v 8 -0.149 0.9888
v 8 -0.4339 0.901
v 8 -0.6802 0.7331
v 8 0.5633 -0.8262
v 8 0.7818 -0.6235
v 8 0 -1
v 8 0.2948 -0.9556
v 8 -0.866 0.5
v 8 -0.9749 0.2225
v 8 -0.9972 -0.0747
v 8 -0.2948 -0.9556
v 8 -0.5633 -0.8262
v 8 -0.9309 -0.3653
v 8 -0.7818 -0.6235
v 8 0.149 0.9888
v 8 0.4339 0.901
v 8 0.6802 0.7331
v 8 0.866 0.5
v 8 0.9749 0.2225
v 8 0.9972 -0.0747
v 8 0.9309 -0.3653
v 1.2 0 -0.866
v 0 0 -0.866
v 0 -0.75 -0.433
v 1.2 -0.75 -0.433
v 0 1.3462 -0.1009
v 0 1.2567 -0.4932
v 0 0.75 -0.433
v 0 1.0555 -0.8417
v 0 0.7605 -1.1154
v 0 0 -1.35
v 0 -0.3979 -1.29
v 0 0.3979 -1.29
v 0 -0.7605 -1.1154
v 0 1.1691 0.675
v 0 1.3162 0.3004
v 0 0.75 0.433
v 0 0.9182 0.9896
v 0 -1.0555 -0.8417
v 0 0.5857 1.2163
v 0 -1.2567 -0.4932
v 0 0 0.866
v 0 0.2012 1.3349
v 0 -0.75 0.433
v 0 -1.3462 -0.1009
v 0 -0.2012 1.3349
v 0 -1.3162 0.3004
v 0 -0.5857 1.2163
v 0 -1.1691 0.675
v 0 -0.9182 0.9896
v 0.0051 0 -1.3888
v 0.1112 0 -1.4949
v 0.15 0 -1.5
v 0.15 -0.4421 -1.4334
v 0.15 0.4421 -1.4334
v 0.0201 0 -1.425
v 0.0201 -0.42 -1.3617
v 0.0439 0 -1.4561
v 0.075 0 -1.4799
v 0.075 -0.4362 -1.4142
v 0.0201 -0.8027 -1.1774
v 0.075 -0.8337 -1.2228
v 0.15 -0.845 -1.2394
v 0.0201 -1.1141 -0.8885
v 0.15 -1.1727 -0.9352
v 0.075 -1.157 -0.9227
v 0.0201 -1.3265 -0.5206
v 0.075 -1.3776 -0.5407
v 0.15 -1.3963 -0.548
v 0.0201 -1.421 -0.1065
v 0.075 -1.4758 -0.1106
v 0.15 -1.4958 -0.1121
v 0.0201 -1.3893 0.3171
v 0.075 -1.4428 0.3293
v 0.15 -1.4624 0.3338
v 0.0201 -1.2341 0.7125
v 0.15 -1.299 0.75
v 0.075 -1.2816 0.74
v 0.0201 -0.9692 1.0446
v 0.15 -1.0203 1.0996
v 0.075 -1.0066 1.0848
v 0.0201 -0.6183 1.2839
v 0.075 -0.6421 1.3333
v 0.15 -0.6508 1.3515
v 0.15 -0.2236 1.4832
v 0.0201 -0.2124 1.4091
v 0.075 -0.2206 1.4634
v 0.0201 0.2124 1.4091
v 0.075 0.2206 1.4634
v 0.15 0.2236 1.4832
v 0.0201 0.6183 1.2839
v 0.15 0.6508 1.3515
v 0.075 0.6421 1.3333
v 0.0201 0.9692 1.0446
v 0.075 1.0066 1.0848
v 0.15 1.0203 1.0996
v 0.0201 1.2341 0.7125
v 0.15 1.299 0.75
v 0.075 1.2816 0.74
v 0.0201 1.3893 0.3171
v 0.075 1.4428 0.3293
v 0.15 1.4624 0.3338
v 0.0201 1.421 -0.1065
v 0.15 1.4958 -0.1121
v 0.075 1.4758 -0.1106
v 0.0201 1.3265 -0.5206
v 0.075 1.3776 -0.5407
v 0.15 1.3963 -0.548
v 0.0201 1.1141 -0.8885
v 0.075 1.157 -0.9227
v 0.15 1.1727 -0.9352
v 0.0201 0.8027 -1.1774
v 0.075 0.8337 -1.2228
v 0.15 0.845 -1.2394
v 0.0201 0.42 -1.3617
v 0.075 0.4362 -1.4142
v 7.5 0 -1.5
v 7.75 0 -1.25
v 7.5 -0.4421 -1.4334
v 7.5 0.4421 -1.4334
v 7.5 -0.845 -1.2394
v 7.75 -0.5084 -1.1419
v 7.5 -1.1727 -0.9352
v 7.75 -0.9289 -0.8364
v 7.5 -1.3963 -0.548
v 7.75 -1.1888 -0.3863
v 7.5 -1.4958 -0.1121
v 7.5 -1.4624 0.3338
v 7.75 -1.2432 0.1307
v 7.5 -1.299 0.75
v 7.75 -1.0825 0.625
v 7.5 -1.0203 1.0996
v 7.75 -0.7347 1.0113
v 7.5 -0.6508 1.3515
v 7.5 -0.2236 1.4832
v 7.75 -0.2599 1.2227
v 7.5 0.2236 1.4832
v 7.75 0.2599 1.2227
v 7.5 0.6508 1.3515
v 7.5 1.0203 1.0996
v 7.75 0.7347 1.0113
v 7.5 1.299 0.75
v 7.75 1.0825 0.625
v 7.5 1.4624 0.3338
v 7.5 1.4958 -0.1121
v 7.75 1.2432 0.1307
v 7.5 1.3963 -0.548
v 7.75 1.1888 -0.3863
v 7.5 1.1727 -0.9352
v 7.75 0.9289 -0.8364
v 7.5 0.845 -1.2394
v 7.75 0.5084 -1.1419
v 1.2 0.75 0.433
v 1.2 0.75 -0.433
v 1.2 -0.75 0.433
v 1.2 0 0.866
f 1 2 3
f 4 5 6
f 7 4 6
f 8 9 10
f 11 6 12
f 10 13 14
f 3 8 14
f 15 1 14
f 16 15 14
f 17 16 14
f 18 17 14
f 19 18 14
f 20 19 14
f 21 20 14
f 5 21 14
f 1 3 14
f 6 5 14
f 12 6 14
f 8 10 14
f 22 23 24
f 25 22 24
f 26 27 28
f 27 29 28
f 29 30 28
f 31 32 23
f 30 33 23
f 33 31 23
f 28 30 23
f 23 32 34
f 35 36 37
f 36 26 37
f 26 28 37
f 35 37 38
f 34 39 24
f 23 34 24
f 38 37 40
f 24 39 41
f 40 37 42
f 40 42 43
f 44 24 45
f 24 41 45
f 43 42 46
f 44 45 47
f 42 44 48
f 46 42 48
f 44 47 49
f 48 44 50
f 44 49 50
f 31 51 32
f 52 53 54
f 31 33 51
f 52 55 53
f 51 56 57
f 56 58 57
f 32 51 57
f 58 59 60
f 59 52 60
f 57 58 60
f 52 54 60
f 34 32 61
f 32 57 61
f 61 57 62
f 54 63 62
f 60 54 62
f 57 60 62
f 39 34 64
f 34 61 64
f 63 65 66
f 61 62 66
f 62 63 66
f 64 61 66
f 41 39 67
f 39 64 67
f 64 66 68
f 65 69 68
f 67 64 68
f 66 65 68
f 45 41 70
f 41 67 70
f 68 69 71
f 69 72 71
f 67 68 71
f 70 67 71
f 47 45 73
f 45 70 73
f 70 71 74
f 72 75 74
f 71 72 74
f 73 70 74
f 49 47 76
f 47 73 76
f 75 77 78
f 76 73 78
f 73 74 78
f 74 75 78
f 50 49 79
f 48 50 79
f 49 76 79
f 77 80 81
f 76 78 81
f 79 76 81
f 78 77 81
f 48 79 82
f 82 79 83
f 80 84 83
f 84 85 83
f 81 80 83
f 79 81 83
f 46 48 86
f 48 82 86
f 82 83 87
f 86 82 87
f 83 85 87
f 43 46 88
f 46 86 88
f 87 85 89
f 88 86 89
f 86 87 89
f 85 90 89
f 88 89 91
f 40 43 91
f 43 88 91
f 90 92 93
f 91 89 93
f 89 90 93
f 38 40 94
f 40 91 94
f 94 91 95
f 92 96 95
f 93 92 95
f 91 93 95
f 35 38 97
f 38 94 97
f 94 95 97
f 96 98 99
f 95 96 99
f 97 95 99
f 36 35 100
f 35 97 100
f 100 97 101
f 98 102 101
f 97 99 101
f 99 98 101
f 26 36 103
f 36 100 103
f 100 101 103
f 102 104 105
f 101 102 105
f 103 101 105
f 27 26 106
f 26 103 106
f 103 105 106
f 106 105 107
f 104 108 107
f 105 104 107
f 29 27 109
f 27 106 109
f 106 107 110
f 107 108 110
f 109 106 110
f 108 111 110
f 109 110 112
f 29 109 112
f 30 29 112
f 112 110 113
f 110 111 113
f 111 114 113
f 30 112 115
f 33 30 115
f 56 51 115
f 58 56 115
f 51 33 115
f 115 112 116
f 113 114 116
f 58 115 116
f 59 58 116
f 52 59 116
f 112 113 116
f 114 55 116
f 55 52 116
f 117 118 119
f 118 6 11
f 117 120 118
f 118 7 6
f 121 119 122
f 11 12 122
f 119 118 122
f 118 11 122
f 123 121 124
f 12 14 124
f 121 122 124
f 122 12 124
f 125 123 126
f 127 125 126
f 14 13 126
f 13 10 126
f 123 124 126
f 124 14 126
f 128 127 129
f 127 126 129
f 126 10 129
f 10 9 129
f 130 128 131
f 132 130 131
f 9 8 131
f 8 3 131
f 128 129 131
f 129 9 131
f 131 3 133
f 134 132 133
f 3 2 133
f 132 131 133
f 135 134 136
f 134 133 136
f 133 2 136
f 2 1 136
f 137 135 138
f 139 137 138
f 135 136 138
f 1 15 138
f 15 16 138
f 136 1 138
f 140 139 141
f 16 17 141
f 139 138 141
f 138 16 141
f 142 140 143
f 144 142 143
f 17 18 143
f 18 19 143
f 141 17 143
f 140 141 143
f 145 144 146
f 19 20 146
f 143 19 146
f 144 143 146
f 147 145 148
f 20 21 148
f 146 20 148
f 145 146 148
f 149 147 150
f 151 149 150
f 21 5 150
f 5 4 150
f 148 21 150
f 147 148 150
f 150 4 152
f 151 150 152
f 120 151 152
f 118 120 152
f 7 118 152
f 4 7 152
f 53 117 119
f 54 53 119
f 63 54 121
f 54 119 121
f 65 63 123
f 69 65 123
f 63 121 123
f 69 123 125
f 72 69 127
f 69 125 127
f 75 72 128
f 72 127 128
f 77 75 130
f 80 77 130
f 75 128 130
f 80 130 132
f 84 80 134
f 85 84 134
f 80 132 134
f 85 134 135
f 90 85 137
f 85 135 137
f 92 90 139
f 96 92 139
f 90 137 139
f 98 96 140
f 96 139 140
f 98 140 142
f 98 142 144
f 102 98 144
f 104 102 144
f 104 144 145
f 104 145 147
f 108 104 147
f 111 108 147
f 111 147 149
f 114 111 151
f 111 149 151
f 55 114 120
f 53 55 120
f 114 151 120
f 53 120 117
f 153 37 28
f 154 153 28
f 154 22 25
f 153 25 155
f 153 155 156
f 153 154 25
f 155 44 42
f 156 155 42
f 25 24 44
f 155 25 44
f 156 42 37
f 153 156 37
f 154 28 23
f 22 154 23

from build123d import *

# Parameters (mm, degrees)
CUT_EXTRUDE1_DEPTH = 1.2
FILLET1_R          = 0.15


with BuildPart() as part:
    # Sketch1 → Revolve1 (revolve)
    with BuildSketch(Plane.XY, mode=Mode.PRIVATE) as revolve1_sk:
        Polygon((0, 0), (0, 1.5), (7.5, 1.5), (8, 1), (8, 0), align=None)
    revolve(revolve1_sk.sketch.rotate(Axis((8, 0, 0), (-1, 0, 0)), 90), axis=Axis((8, 0, 0), (-1, 0, 0)))

    # Sketch2 → Cut-Extrude1 (cut)
    with BuildSketch(Plane.ZY):
        Polygon((0.433012702, 0.75), (-0.433012702, 0.75), (-0.866025404, 0), (-0.433012702, -0.75), (0.433012702, -0.75), (0.866025404, 0), align=None)
    extrude(amount=-CUT_EXTRUDE1_DEPTH, mode=Mode.SUBTRACT)

    # Fillet1
    fillet1_edges = [part.edges().sort_by_distance(p)[0] for p in [
        (0, 0, 1.5),
    ]]
    fillet(fillet1_edges, radius=FILLET1_R)


solid = part.part
